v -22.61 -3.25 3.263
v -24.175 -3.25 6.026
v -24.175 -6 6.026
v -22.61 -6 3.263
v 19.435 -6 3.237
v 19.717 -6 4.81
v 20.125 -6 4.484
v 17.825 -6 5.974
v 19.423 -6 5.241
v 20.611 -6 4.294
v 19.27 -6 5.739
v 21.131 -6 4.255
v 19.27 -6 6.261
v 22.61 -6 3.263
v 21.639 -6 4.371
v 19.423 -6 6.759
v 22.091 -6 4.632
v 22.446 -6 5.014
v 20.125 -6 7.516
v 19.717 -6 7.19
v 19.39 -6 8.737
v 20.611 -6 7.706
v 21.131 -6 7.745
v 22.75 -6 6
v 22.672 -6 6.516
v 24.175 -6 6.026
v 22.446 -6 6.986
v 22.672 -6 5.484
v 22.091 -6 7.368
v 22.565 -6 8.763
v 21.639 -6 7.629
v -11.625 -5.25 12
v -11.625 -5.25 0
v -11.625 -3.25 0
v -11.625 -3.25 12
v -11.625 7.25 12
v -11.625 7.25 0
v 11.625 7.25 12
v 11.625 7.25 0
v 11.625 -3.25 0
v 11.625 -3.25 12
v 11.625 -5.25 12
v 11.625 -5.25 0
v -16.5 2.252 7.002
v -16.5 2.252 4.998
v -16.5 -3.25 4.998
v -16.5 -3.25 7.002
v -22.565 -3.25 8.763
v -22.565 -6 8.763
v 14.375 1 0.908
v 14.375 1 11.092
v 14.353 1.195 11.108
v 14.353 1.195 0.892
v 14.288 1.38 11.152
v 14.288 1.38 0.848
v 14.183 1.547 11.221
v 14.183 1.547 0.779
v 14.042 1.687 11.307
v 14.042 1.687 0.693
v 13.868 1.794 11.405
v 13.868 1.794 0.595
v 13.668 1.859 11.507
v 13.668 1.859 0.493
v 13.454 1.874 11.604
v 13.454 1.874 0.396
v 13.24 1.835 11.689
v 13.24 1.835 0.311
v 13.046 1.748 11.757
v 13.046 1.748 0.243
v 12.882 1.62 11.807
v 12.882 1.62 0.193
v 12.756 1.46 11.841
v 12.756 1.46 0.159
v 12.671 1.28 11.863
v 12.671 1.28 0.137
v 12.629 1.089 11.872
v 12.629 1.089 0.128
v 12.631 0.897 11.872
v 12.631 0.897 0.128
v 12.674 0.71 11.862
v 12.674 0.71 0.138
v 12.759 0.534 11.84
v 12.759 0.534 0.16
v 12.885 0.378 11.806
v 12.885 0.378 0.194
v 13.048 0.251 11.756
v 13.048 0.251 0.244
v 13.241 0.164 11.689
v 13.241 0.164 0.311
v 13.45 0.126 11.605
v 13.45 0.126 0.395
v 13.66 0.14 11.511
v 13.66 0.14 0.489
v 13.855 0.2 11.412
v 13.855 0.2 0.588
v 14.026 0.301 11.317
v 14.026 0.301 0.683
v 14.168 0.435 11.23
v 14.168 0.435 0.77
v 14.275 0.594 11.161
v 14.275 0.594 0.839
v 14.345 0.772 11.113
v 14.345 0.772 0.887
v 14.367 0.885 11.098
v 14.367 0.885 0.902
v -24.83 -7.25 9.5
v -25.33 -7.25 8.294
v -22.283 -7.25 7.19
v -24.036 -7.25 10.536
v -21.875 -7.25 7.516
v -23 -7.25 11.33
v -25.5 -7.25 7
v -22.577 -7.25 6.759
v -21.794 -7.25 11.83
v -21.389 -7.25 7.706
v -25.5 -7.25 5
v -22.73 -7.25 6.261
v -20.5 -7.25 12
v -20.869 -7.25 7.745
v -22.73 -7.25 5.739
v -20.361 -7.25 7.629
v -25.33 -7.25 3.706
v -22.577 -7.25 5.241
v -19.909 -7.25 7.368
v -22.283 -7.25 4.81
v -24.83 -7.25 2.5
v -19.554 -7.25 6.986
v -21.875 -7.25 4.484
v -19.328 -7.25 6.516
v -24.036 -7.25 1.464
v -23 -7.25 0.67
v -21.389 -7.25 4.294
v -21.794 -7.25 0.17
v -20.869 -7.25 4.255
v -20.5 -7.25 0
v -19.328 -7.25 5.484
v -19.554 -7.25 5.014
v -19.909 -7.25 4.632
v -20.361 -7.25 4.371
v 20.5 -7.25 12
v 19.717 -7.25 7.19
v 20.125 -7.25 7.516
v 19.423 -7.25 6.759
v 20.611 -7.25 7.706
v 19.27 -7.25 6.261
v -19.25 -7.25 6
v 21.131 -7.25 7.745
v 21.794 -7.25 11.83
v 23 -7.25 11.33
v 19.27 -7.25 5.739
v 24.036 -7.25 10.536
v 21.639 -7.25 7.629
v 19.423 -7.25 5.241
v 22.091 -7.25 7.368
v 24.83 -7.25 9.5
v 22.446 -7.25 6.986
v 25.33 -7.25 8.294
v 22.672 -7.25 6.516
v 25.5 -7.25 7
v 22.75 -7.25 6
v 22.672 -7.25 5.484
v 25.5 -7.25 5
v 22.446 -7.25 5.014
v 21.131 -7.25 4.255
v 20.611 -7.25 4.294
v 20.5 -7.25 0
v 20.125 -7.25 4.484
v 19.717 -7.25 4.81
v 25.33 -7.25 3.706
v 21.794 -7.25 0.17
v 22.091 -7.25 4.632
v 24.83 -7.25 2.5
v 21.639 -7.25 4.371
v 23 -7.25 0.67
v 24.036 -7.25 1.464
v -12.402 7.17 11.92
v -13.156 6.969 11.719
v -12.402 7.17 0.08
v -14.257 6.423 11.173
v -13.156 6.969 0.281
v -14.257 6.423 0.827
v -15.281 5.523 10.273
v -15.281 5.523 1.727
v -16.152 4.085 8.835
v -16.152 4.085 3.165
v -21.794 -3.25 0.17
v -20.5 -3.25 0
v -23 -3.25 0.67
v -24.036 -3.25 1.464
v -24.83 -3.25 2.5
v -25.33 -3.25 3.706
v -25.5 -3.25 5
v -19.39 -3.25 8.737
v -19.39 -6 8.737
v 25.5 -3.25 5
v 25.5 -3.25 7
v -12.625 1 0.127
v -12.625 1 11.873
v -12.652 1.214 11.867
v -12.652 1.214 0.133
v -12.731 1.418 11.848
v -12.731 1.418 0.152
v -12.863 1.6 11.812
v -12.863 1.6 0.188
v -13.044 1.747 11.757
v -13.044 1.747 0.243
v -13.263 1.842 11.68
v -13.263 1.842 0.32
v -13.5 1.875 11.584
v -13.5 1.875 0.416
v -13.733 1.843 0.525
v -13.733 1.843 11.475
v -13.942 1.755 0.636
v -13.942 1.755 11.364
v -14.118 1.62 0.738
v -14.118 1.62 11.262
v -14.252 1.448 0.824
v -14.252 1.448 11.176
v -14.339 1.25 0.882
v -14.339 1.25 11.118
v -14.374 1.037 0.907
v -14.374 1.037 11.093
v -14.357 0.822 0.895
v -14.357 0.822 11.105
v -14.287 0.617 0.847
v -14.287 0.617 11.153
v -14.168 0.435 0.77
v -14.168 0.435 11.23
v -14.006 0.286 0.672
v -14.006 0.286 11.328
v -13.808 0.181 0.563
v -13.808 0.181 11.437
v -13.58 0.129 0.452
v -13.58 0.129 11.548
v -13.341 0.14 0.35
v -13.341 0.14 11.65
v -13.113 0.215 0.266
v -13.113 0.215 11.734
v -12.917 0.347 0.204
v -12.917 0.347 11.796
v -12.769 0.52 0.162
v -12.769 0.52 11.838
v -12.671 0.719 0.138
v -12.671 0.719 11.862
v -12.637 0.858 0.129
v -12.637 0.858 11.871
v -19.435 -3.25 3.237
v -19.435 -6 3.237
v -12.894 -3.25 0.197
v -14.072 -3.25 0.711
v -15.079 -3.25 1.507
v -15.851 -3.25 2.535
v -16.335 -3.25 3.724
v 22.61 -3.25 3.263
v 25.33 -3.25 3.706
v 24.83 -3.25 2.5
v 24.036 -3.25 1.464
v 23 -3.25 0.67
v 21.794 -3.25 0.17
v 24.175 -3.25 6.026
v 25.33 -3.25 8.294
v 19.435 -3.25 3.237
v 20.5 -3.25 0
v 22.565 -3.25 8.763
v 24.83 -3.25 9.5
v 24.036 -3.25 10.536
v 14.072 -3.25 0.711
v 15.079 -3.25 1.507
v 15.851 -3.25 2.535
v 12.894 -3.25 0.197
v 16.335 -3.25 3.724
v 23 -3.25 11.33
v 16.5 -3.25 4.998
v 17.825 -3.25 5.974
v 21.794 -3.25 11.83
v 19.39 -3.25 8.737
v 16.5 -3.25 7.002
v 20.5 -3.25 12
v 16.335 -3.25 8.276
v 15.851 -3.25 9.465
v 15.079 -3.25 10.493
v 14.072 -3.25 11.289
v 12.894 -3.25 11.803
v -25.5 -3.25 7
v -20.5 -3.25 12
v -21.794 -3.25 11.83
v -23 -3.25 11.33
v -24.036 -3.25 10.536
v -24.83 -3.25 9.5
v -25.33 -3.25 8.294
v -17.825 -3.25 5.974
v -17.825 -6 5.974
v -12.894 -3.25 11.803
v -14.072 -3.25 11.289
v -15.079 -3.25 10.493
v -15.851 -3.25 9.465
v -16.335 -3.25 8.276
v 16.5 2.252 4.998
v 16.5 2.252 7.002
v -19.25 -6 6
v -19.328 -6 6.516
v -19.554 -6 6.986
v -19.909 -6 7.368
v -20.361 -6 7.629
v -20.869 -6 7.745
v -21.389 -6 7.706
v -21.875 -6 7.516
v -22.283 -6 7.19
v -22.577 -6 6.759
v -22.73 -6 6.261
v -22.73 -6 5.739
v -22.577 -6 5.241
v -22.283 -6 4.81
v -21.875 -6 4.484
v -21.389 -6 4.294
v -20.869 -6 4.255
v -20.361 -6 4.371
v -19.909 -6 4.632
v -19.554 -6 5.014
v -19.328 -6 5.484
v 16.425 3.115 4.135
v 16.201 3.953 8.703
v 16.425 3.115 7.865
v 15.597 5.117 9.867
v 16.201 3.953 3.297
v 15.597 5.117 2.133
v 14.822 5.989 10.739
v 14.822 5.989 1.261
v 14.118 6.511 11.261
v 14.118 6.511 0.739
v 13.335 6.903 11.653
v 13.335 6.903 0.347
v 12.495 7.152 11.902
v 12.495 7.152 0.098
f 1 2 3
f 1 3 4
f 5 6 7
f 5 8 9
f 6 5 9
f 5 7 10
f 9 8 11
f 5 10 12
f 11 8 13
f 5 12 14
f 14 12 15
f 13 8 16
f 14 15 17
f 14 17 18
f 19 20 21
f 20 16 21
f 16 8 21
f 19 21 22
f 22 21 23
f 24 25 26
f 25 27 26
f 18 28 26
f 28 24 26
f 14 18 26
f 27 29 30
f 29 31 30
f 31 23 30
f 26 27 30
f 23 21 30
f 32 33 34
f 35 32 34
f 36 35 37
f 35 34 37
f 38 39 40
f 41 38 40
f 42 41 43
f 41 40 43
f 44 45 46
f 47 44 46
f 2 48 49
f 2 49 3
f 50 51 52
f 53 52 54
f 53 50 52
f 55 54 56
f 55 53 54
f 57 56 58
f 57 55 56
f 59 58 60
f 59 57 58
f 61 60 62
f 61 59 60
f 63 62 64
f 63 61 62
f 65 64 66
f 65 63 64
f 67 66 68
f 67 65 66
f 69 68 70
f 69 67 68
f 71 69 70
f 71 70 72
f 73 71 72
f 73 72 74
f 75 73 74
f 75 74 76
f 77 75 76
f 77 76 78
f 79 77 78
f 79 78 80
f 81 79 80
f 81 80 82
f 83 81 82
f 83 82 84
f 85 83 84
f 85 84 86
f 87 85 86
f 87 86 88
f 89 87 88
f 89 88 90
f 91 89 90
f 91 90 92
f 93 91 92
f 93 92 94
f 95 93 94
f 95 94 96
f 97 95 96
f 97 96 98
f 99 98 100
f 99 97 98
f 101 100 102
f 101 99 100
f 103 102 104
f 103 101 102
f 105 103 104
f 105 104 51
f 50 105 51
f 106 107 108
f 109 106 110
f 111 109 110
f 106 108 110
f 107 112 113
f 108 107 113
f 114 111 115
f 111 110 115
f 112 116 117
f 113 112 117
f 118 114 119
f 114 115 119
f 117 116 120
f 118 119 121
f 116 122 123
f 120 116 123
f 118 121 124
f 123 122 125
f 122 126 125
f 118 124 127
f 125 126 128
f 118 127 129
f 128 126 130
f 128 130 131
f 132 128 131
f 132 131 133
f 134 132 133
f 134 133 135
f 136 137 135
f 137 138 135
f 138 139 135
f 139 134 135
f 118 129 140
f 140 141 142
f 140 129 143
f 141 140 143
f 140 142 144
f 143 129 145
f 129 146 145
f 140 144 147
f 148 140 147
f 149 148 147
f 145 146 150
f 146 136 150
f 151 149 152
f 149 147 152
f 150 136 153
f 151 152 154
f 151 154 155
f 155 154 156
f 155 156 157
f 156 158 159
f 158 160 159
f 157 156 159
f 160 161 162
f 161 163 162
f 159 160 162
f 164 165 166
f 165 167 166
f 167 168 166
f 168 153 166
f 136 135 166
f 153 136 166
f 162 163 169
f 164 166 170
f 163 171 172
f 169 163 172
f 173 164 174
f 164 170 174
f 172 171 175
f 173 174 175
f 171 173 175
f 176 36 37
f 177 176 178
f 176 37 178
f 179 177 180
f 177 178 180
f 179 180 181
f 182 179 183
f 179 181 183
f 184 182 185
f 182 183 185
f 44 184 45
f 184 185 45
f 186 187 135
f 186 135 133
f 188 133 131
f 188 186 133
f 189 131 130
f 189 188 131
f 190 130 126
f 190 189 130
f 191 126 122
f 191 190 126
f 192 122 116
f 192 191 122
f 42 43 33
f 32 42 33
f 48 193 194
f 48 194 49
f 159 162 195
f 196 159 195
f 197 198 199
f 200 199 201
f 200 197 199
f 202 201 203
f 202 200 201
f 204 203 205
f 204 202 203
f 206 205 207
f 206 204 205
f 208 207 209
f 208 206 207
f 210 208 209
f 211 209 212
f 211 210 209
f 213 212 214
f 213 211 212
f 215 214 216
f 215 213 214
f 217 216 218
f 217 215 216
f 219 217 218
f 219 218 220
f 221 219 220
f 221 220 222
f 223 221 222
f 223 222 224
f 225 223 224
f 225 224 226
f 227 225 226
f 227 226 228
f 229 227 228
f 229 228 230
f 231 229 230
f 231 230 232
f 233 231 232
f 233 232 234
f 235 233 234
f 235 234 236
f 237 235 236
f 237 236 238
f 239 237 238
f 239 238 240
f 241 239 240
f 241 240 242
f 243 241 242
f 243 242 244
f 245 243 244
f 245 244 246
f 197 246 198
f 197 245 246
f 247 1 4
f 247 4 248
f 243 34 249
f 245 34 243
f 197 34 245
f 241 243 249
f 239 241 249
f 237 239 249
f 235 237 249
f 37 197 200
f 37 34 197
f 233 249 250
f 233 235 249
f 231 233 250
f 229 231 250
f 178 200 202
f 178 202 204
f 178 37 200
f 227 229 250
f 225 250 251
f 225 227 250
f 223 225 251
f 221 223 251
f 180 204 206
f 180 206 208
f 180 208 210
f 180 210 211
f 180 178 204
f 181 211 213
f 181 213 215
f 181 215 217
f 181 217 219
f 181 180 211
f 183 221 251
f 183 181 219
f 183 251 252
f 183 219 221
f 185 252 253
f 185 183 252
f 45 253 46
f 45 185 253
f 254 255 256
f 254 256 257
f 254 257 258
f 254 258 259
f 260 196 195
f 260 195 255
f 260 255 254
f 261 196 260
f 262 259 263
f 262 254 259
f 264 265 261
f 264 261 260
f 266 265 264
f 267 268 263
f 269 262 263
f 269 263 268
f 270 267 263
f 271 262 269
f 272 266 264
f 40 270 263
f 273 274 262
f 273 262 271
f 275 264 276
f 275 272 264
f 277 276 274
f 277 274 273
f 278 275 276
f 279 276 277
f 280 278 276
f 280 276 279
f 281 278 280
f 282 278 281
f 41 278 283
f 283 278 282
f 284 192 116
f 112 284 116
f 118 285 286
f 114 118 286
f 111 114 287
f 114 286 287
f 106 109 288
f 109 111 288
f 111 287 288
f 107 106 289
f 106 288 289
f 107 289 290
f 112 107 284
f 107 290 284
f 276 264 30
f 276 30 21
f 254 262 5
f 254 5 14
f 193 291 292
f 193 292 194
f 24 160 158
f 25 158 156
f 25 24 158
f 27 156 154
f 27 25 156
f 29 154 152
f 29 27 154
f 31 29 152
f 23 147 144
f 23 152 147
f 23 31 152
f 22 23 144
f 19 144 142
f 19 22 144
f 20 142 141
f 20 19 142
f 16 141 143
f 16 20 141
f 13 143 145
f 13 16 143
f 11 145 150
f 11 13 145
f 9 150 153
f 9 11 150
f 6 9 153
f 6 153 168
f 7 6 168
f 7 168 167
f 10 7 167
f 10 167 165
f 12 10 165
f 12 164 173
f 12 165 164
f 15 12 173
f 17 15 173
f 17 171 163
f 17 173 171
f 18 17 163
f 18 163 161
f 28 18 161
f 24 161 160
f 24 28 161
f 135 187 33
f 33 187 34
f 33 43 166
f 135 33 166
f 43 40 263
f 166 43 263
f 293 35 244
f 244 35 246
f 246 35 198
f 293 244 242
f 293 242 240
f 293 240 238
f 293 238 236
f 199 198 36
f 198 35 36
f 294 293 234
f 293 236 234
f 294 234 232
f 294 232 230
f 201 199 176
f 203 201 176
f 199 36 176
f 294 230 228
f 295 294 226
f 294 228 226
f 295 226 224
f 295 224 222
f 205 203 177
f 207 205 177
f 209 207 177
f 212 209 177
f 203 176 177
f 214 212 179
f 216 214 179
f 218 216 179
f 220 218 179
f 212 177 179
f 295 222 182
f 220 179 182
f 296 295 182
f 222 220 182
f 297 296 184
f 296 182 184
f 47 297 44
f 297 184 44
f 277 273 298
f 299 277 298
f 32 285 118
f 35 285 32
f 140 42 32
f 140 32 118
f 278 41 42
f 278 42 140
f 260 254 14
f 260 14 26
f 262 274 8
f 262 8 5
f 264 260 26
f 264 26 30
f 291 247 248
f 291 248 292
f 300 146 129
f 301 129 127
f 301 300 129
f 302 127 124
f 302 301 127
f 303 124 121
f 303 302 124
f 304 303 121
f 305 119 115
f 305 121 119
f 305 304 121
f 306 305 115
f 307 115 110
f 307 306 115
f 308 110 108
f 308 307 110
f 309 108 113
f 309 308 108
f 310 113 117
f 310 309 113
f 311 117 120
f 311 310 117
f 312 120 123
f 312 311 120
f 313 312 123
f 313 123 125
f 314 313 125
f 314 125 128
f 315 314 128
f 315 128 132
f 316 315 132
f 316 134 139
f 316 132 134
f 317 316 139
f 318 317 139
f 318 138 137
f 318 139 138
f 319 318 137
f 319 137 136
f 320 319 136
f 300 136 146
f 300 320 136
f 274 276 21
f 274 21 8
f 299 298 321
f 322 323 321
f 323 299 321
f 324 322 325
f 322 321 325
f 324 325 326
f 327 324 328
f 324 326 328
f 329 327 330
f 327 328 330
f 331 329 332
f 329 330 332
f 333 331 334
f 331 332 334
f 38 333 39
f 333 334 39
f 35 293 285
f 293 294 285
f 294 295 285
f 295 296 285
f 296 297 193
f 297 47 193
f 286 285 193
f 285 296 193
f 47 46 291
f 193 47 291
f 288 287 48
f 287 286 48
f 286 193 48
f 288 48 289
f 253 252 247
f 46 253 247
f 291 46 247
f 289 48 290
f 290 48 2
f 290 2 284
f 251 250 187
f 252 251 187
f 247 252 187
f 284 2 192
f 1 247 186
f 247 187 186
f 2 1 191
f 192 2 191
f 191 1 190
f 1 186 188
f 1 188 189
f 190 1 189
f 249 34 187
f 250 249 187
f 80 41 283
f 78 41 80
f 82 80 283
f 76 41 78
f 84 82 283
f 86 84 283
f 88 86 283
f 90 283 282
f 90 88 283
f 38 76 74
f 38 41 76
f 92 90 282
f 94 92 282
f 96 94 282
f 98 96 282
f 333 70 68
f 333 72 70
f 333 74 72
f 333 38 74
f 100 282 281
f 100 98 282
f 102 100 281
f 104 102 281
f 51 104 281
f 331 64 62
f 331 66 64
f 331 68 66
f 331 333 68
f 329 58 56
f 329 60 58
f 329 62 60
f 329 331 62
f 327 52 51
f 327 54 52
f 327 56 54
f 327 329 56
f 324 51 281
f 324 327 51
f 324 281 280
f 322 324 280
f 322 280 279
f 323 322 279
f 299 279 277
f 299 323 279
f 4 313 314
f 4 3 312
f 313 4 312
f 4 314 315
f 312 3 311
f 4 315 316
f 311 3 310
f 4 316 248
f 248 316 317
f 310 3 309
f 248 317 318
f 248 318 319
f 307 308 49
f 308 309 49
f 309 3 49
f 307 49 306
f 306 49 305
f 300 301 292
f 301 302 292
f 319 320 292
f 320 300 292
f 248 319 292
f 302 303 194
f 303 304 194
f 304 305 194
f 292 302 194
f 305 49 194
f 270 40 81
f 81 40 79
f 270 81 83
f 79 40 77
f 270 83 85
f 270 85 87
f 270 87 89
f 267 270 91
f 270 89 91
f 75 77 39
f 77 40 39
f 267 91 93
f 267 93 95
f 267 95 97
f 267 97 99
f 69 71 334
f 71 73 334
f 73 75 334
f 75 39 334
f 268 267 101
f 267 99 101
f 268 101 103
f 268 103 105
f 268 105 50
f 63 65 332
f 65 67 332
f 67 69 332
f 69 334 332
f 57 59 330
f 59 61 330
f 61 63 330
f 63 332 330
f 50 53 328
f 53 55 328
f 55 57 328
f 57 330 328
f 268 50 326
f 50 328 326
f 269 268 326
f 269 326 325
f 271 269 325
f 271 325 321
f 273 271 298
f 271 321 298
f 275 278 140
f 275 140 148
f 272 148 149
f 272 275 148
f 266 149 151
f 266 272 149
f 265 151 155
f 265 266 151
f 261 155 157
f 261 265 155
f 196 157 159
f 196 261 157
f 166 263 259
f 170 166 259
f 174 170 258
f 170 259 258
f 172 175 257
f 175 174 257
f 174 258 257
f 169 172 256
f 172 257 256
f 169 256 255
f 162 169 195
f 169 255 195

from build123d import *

# Parameters (mm, degrees)
F0_R        = 0.875
F1_DEPTH    = 12
F2_R        = 1.75
F3_DEPTH    = 25
F4_DEPTH    = 6
F5_T1_DEPTH = 36.9921862789
F5_T3_DEPTH = 22.9960931395
F5_T5_DEPTH = 29


# Not quite as in the source:
# - a fillet or chamfer that OpenCascade refuses, or shapes differently, is made with other operations: its cross-section is extruded or revolved along the edge and cut away or added


with BuildPart() as f1:
    # F0 (on Top) → F1 (new body)
    with BuildSketch(Plane.XY):
        Polygon((-11.625, -5.25), (-11.625, 7.25), (-16.5, 7.25), (-16.5, -3.25), (-16.5, -5.25), align=None)
        with Locations((-13.5, 1)):
            Circle(F0_R, mode=Mode.SUBTRACT)
        Polygon((-16.5, -5.25), (-16.5, -3.25), (-25.5, -3.25), (-25.5, -7.25), (-16.5, -7.25), align=None)
        Polygon((16.5, -3.25), (16.5, 7.25), (11.625, 7.25), (11.625, -5.25), (16.5, -5.25), align=None)
        with Locations((13.5, 1)):
            Circle(F0_R, mode=Mode.SUBTRACT)
        Polygon((25.5, -3.25), (16.5, -3.25), (16.5, -5.25), (16.5, -7.25), (25.5, -7.25), align=None)
        Polygon((16.5, -5.25), (11.625, -5.25), (-11.625, -5.25), (-16.5, -5.25), (-16.5, -7.25), (16.5, -7.25), align=None)
    extrude(amount=F1_DEPTH)

    # F2 (on Front) → F3 (cut)
    with BuildSketch(Plane.XZ):
        with Locations((21, 6)):
            Circle(F2_R)
        with Locations((-21, 6)):
            Circle(F2_R)
    extrude(amount=F3_DEPTH, mode=Mode.SUBTRACT)

    # F2 (on Front) → F4 (cut)
    with BuildSketch(Plane.XZ):
        Polygon((17.8246783439, 5.9741985751), (19.4346838614, 3.2371900682), (22.6100055175, 3.2629914931), (24.1753216561, 6.0258014249), (22.5653161386, 8.7628099318), (19.3899944825, 8.7370085069), align=None)
        with Locations((21, 6)):
            Circle(F2_R, mode=Mode.SUBTRACT)
        Polygon((-22.6100055175, 3.2629914931), (-19.4346838614, 3.2371900682), (-17.8246783439, 5.9741985751), (-19.3899944825, 8.7370085069), (-22.5653161386, 8.7628099318), (-24.1753216561, 6.0258014249), align=None)
        with Locations((-21, 6)):
            Circle(F2_R, mode=Mode.SUBTRACT)
    extrude(amount=F4_DEPTH, mode=Mode.SUBTRACT)

    # F5: fillet of radius 5 on 10 edges, made by hand

    # F5_s2 → F5_t1 (cut)
    with BuildSketch(Plane.XY.offset(-12.4960931395)):
        with BuildLine():
            ThreePointArc((-11.625, 7.25), (-15.0794552658, 5.7426227552), (-16.5, 2.2515627442))
            Line((-16.5, 2.2515627442), (-16.5, 7.25))
            Line((-16.5, 7.25), (-11.625, 7.25))
        make_face()
        with BuildLine():
            ThreePointArc((16.5, 2.2515627442), (15.0794552658, 5.7426227552), (11.625, 7.25))
            Line((11.625, 7.25), (16.5, 7.25))
            Line((16.5, 7.25), (16.5, 2.2515627442))
        make_face()
    extrude(amount=F5_T1_DEPTH, mode=Mode.SUBTRACT)

    # F5_s4 → F5_t3 (cut)
    with BuildSketch(Plane.XZ.offset(-19.7460931395)):
        with BuildLine():
            ThreePointArc((11.625, 12), (15.0794552658, 10.4926227552), (16.5, 7.0015627442))
            Line((16.5, 7.0015627442), (16.5, 12))
            Line((16.5, 12), (11.625, 12))
        make_face()
        with BuildLine():
            ThreePointArc((11.625, 0), (15.0794552658, 1.5073772448), (16.5, 4.9984372558))
            Line((16.5, 4.9984372558), (16.5, 0))
            Line((16.5, 0), (11.625, 0))
        make_face()
        with BuildLine():
            ThreePointArc((-11.625, 0), (-15.0794552658, 1.5073772448), (-16.5, 4.9984372558))
            Line((-16.5, 4.9984372558), (-16.5, 0))
            Line((-16.5, 0), (-11.625, 0))
        make_face()
        with BuildLine():
            ThreePointArc((-11.625, 12), (-15.0794552658, 10.4926227552), (-16.5, 7.0015627442))
            Line((-16.5, 7.0015627442), (-16.5, 12))
            Line((-16.5, 12), (-11.625, 12))
        make_face()
    extrude(amount=F5_T3_DEPTH, mode=Mode.SUBTRACT)

    # F5_s6 → F5_t5 (cut)
    with BuildSketch(Plane.XZ.offset(-9.25)):
        with BuildLine():
            ThreePointArc((20.5, 0), (24.0355339059, 1.4644660941), (25.5, 5))
            Line((25.5, 5), (25.5, 0))
            Line((25.5, 0), (20.5, 0))
        make_face()
        with BuildLine():
            ThreePointArc((20.5, 12), (24.0355339059, 10.5355339059), (25.5, 7))
            Line((25.5, 7), (25.5, 12))
            Line((25.5, 12), (20.5, 12))
        make_face()
        with BuildLine():
            ThreePointArc((-20.5, 12), (-24.0355339059, 10.5355339059), (-25.5, 7))
            Line((-25.5, 7), (-25.5, 12))
            Line((-25.5, 12), (-20.5, 12))
        make_face()
        with BuildLine():
            ThreePointArc((-20.5, 0), (-24.0355339059, 1.4644660941), (-25.5, 5))
            Line((-25.5, 5), (-25.5, 0))
            Line((-25.5, 0), (-20.5, 0))
        make_face()
    extrude(amount=F5_T5_DEPTH, mode=Mode.SUBTRACT)


solid = f1.part
